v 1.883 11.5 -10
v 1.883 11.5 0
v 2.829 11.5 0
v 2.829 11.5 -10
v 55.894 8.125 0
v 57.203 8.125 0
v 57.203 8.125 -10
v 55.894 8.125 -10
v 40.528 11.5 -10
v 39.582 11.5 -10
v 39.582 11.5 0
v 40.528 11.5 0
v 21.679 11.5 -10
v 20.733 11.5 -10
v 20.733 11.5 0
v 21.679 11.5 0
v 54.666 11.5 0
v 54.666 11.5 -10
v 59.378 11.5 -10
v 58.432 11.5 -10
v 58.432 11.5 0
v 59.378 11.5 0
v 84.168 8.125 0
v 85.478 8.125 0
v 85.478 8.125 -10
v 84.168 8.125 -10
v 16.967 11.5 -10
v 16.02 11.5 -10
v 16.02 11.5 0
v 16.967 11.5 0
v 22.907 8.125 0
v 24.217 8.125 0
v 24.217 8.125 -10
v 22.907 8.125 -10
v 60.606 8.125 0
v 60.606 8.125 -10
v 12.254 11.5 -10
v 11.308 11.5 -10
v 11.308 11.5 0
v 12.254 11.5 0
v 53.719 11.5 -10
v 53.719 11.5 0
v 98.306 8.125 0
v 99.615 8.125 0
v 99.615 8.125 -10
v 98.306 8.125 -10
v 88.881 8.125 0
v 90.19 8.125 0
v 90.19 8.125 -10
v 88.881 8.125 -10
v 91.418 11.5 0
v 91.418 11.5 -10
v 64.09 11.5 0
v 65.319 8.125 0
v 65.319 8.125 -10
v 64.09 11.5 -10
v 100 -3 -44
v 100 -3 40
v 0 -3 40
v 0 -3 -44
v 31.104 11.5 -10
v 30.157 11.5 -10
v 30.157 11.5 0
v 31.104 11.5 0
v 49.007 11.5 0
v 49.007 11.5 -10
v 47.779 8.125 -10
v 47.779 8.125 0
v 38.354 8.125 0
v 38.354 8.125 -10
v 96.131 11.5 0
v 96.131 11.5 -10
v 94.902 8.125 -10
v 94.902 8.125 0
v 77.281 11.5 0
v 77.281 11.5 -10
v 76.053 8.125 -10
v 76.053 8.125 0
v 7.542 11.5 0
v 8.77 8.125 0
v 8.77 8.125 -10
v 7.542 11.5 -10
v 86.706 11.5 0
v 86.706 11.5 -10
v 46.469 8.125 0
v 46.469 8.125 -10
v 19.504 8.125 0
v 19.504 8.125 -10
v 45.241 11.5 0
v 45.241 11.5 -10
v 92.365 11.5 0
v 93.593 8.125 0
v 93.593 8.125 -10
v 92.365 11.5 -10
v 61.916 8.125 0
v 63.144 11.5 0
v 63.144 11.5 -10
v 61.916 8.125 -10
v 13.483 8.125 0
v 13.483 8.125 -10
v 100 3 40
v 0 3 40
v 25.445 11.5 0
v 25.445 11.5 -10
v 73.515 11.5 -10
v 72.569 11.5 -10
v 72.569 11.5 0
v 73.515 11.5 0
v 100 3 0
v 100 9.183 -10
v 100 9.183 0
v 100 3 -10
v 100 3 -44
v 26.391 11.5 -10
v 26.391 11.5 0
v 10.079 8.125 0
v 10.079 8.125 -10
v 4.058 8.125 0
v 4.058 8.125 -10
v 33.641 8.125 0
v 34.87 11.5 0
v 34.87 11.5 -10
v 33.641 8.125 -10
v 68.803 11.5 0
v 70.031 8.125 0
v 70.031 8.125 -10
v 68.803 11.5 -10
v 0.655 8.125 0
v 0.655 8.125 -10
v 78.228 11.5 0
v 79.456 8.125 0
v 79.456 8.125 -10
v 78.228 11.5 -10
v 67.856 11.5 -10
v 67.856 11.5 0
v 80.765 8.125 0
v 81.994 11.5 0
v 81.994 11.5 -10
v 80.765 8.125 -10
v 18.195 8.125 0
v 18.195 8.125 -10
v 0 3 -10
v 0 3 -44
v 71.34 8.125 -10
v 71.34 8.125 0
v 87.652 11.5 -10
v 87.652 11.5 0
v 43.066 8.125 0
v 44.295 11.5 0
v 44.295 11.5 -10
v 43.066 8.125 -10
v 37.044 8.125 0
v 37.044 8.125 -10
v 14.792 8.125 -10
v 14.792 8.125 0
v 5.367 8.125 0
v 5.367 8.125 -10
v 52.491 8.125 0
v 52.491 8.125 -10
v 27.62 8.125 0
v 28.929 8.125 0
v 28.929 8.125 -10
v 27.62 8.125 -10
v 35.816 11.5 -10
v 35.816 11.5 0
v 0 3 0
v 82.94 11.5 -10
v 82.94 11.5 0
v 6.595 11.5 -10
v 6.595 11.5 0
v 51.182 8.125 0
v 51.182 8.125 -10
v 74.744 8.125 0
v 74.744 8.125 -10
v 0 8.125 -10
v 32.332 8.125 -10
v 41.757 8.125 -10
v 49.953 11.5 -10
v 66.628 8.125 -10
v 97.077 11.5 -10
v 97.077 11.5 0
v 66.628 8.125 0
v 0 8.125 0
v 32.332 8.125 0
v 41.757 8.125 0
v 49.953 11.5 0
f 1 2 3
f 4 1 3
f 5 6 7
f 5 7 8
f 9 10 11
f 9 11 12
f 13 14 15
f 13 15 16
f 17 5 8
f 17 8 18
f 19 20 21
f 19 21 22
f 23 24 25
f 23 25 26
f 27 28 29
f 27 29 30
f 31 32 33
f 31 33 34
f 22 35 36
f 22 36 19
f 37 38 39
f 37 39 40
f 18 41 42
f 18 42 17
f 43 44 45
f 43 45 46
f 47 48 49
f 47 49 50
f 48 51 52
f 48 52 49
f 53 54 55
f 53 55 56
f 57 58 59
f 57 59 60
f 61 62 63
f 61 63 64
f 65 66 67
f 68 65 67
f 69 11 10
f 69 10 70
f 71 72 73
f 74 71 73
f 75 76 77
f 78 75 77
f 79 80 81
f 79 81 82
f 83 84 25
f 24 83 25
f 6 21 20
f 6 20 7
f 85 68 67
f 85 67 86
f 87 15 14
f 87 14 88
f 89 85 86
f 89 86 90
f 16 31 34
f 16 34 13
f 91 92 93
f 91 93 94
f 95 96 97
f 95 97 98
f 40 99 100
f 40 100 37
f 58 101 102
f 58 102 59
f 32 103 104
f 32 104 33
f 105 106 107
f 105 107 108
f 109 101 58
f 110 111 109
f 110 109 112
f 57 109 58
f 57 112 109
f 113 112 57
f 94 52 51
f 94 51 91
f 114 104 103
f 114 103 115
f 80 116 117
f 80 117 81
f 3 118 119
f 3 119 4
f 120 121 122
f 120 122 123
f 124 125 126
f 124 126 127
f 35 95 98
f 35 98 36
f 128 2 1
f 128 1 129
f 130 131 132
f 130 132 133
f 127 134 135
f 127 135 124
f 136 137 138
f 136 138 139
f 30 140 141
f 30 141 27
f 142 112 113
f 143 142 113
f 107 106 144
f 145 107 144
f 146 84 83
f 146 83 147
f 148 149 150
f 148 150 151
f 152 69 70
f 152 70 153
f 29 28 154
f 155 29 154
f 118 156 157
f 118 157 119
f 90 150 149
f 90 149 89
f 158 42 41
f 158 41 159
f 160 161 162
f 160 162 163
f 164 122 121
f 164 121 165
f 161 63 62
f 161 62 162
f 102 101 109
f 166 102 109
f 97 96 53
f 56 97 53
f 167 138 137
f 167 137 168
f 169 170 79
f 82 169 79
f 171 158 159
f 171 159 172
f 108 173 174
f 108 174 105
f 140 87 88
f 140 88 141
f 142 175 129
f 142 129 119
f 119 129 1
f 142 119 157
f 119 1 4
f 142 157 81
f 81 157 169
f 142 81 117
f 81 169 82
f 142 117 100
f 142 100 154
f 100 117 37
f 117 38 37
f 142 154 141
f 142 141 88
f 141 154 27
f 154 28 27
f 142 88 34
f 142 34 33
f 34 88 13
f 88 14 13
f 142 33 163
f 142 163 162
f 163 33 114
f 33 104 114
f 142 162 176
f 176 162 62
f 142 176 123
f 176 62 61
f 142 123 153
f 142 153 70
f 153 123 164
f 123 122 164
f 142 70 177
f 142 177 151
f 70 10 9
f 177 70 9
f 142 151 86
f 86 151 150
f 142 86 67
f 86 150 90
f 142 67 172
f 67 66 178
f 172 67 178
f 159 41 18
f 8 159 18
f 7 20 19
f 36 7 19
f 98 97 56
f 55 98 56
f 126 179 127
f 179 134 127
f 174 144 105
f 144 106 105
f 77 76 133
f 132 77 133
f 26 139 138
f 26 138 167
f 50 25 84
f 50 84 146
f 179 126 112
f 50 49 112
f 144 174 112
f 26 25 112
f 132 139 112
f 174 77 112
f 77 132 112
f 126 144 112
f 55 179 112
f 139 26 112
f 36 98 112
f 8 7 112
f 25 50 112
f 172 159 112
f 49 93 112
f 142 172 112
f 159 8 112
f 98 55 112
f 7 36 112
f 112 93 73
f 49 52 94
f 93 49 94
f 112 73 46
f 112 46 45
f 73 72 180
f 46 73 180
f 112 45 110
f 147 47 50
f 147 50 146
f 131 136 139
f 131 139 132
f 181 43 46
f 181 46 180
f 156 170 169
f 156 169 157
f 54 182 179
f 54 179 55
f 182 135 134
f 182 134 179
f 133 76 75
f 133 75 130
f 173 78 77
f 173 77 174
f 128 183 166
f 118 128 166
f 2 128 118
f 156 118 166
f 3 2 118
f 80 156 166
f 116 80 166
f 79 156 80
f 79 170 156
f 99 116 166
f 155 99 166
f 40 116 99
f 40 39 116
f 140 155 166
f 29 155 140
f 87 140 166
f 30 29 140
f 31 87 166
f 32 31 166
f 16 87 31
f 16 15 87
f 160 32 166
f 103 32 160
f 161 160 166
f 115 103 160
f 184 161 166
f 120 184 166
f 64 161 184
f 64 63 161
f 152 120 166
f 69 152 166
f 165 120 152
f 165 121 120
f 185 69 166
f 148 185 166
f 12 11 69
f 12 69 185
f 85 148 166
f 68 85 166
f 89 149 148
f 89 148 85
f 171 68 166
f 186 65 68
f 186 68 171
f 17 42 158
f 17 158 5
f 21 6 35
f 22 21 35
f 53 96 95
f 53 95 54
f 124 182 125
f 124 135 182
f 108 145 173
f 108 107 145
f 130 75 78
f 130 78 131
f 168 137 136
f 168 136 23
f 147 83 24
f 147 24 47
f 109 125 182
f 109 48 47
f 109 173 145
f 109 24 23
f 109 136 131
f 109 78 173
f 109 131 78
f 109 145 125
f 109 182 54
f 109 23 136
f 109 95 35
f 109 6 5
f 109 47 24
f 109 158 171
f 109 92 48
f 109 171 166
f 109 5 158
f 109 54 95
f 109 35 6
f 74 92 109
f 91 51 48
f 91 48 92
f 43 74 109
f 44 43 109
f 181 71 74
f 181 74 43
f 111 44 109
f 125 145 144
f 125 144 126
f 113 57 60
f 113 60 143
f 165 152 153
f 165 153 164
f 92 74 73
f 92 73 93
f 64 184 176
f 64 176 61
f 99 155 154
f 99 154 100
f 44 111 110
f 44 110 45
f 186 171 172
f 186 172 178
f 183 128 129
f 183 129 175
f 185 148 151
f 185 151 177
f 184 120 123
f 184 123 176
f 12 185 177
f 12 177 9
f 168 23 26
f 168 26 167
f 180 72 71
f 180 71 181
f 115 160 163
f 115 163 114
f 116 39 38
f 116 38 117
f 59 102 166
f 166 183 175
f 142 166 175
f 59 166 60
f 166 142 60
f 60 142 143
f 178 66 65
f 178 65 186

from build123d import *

# Parameters (mm, degrees)
BLANKSKE_W          = 100
BLANKSKE_H          = 11.5
BLANK_DEPTH         = 10
TOOTHCUTSIM_DEPTH   = 102.154584671
TEETHCUTS_COUNT     = 22
TEETHCUTS_PITCH     = 4.712388975
SKETCH2_W           = 40
SKETCH2_H           = 3
SKETCH2_W_2         = 34.0000508
BOSS_EXTRUDE1_DEPTH = 100


with BuildPart() as part:
    # BlankSke → Blank (new body)
    with BuildSketch(Plane.XY):
        with Locations((50, 5.75)):
            Rectangle(BLANKSKE_W, BLANKSKE_H)
    extrude(amount=-BLANK_DEPTH)

    # TooCutSkeSim → ToothCutSim (cut, through all)
    with BuildSketch(Plane.XY):
        Polygon((0.654653055, 8.125), (-0.654653055, 8.125), (-1.892297439, 11.5254), (1.892297439, 11.5254), align=None)
    toothcutsim = extrude(amount=-TOOTHCUTSIM_DEPTH, mode=Mode.SUBTRACT)

    # TeethCuts: ToothCutSim ×22
    with Locations(*[(i * TEETHCUTS_PITCH, 0, 0) for i in range(1, TEETHCUTS_COUNT)]):
        add(toothcutsim, mode=Mode.SUBTRACT)

    # Sketch2 → Boss-Extrude1 (add)
    with BuildSketch(Plane(origin=(100, 0, 0), x_dir=(0, 0, -1), z_dir=(1, 0, 0))):
        with Locations((-20, 1.5)):
            Rectangle(SKETCH2_W, SKETCH2_H)
        with Locations((27.0000254, 1.5)):
            Rectangle(SKETCH2_W_2, SKETCH2_H)
        Polygon((44.0000508, -3), (44.0000508, 0), (10, 0), (0, 0), (-40, 0), (-40, -3), align=None)
    extrude(amount=-BOSS_EXTRUDE1_DEPTH)


solid = part.part
